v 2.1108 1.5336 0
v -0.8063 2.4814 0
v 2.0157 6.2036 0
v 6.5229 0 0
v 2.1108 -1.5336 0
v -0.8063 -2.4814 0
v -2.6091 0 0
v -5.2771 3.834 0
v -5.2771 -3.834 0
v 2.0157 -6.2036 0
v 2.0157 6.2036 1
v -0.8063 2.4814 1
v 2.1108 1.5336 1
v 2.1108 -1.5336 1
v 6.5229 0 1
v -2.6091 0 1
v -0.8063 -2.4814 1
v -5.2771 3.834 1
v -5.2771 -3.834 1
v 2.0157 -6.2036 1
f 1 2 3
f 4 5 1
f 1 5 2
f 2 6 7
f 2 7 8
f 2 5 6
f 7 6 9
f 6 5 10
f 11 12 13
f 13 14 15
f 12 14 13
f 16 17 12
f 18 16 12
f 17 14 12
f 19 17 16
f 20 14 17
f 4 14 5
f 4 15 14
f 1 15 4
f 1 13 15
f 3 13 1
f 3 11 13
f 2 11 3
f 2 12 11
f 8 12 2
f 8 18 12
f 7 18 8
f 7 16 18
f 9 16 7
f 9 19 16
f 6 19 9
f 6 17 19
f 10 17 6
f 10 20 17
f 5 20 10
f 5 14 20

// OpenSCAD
// sharp offset of a concave polygon
star = [for (i = [0:9]) let (r = i % 2 == 0 ? 5 : 2, a = i * 36) [r * cos(a), r * sin(a)]];
linear_extrude(1) offset(delta = 0.5) polygon(star);
